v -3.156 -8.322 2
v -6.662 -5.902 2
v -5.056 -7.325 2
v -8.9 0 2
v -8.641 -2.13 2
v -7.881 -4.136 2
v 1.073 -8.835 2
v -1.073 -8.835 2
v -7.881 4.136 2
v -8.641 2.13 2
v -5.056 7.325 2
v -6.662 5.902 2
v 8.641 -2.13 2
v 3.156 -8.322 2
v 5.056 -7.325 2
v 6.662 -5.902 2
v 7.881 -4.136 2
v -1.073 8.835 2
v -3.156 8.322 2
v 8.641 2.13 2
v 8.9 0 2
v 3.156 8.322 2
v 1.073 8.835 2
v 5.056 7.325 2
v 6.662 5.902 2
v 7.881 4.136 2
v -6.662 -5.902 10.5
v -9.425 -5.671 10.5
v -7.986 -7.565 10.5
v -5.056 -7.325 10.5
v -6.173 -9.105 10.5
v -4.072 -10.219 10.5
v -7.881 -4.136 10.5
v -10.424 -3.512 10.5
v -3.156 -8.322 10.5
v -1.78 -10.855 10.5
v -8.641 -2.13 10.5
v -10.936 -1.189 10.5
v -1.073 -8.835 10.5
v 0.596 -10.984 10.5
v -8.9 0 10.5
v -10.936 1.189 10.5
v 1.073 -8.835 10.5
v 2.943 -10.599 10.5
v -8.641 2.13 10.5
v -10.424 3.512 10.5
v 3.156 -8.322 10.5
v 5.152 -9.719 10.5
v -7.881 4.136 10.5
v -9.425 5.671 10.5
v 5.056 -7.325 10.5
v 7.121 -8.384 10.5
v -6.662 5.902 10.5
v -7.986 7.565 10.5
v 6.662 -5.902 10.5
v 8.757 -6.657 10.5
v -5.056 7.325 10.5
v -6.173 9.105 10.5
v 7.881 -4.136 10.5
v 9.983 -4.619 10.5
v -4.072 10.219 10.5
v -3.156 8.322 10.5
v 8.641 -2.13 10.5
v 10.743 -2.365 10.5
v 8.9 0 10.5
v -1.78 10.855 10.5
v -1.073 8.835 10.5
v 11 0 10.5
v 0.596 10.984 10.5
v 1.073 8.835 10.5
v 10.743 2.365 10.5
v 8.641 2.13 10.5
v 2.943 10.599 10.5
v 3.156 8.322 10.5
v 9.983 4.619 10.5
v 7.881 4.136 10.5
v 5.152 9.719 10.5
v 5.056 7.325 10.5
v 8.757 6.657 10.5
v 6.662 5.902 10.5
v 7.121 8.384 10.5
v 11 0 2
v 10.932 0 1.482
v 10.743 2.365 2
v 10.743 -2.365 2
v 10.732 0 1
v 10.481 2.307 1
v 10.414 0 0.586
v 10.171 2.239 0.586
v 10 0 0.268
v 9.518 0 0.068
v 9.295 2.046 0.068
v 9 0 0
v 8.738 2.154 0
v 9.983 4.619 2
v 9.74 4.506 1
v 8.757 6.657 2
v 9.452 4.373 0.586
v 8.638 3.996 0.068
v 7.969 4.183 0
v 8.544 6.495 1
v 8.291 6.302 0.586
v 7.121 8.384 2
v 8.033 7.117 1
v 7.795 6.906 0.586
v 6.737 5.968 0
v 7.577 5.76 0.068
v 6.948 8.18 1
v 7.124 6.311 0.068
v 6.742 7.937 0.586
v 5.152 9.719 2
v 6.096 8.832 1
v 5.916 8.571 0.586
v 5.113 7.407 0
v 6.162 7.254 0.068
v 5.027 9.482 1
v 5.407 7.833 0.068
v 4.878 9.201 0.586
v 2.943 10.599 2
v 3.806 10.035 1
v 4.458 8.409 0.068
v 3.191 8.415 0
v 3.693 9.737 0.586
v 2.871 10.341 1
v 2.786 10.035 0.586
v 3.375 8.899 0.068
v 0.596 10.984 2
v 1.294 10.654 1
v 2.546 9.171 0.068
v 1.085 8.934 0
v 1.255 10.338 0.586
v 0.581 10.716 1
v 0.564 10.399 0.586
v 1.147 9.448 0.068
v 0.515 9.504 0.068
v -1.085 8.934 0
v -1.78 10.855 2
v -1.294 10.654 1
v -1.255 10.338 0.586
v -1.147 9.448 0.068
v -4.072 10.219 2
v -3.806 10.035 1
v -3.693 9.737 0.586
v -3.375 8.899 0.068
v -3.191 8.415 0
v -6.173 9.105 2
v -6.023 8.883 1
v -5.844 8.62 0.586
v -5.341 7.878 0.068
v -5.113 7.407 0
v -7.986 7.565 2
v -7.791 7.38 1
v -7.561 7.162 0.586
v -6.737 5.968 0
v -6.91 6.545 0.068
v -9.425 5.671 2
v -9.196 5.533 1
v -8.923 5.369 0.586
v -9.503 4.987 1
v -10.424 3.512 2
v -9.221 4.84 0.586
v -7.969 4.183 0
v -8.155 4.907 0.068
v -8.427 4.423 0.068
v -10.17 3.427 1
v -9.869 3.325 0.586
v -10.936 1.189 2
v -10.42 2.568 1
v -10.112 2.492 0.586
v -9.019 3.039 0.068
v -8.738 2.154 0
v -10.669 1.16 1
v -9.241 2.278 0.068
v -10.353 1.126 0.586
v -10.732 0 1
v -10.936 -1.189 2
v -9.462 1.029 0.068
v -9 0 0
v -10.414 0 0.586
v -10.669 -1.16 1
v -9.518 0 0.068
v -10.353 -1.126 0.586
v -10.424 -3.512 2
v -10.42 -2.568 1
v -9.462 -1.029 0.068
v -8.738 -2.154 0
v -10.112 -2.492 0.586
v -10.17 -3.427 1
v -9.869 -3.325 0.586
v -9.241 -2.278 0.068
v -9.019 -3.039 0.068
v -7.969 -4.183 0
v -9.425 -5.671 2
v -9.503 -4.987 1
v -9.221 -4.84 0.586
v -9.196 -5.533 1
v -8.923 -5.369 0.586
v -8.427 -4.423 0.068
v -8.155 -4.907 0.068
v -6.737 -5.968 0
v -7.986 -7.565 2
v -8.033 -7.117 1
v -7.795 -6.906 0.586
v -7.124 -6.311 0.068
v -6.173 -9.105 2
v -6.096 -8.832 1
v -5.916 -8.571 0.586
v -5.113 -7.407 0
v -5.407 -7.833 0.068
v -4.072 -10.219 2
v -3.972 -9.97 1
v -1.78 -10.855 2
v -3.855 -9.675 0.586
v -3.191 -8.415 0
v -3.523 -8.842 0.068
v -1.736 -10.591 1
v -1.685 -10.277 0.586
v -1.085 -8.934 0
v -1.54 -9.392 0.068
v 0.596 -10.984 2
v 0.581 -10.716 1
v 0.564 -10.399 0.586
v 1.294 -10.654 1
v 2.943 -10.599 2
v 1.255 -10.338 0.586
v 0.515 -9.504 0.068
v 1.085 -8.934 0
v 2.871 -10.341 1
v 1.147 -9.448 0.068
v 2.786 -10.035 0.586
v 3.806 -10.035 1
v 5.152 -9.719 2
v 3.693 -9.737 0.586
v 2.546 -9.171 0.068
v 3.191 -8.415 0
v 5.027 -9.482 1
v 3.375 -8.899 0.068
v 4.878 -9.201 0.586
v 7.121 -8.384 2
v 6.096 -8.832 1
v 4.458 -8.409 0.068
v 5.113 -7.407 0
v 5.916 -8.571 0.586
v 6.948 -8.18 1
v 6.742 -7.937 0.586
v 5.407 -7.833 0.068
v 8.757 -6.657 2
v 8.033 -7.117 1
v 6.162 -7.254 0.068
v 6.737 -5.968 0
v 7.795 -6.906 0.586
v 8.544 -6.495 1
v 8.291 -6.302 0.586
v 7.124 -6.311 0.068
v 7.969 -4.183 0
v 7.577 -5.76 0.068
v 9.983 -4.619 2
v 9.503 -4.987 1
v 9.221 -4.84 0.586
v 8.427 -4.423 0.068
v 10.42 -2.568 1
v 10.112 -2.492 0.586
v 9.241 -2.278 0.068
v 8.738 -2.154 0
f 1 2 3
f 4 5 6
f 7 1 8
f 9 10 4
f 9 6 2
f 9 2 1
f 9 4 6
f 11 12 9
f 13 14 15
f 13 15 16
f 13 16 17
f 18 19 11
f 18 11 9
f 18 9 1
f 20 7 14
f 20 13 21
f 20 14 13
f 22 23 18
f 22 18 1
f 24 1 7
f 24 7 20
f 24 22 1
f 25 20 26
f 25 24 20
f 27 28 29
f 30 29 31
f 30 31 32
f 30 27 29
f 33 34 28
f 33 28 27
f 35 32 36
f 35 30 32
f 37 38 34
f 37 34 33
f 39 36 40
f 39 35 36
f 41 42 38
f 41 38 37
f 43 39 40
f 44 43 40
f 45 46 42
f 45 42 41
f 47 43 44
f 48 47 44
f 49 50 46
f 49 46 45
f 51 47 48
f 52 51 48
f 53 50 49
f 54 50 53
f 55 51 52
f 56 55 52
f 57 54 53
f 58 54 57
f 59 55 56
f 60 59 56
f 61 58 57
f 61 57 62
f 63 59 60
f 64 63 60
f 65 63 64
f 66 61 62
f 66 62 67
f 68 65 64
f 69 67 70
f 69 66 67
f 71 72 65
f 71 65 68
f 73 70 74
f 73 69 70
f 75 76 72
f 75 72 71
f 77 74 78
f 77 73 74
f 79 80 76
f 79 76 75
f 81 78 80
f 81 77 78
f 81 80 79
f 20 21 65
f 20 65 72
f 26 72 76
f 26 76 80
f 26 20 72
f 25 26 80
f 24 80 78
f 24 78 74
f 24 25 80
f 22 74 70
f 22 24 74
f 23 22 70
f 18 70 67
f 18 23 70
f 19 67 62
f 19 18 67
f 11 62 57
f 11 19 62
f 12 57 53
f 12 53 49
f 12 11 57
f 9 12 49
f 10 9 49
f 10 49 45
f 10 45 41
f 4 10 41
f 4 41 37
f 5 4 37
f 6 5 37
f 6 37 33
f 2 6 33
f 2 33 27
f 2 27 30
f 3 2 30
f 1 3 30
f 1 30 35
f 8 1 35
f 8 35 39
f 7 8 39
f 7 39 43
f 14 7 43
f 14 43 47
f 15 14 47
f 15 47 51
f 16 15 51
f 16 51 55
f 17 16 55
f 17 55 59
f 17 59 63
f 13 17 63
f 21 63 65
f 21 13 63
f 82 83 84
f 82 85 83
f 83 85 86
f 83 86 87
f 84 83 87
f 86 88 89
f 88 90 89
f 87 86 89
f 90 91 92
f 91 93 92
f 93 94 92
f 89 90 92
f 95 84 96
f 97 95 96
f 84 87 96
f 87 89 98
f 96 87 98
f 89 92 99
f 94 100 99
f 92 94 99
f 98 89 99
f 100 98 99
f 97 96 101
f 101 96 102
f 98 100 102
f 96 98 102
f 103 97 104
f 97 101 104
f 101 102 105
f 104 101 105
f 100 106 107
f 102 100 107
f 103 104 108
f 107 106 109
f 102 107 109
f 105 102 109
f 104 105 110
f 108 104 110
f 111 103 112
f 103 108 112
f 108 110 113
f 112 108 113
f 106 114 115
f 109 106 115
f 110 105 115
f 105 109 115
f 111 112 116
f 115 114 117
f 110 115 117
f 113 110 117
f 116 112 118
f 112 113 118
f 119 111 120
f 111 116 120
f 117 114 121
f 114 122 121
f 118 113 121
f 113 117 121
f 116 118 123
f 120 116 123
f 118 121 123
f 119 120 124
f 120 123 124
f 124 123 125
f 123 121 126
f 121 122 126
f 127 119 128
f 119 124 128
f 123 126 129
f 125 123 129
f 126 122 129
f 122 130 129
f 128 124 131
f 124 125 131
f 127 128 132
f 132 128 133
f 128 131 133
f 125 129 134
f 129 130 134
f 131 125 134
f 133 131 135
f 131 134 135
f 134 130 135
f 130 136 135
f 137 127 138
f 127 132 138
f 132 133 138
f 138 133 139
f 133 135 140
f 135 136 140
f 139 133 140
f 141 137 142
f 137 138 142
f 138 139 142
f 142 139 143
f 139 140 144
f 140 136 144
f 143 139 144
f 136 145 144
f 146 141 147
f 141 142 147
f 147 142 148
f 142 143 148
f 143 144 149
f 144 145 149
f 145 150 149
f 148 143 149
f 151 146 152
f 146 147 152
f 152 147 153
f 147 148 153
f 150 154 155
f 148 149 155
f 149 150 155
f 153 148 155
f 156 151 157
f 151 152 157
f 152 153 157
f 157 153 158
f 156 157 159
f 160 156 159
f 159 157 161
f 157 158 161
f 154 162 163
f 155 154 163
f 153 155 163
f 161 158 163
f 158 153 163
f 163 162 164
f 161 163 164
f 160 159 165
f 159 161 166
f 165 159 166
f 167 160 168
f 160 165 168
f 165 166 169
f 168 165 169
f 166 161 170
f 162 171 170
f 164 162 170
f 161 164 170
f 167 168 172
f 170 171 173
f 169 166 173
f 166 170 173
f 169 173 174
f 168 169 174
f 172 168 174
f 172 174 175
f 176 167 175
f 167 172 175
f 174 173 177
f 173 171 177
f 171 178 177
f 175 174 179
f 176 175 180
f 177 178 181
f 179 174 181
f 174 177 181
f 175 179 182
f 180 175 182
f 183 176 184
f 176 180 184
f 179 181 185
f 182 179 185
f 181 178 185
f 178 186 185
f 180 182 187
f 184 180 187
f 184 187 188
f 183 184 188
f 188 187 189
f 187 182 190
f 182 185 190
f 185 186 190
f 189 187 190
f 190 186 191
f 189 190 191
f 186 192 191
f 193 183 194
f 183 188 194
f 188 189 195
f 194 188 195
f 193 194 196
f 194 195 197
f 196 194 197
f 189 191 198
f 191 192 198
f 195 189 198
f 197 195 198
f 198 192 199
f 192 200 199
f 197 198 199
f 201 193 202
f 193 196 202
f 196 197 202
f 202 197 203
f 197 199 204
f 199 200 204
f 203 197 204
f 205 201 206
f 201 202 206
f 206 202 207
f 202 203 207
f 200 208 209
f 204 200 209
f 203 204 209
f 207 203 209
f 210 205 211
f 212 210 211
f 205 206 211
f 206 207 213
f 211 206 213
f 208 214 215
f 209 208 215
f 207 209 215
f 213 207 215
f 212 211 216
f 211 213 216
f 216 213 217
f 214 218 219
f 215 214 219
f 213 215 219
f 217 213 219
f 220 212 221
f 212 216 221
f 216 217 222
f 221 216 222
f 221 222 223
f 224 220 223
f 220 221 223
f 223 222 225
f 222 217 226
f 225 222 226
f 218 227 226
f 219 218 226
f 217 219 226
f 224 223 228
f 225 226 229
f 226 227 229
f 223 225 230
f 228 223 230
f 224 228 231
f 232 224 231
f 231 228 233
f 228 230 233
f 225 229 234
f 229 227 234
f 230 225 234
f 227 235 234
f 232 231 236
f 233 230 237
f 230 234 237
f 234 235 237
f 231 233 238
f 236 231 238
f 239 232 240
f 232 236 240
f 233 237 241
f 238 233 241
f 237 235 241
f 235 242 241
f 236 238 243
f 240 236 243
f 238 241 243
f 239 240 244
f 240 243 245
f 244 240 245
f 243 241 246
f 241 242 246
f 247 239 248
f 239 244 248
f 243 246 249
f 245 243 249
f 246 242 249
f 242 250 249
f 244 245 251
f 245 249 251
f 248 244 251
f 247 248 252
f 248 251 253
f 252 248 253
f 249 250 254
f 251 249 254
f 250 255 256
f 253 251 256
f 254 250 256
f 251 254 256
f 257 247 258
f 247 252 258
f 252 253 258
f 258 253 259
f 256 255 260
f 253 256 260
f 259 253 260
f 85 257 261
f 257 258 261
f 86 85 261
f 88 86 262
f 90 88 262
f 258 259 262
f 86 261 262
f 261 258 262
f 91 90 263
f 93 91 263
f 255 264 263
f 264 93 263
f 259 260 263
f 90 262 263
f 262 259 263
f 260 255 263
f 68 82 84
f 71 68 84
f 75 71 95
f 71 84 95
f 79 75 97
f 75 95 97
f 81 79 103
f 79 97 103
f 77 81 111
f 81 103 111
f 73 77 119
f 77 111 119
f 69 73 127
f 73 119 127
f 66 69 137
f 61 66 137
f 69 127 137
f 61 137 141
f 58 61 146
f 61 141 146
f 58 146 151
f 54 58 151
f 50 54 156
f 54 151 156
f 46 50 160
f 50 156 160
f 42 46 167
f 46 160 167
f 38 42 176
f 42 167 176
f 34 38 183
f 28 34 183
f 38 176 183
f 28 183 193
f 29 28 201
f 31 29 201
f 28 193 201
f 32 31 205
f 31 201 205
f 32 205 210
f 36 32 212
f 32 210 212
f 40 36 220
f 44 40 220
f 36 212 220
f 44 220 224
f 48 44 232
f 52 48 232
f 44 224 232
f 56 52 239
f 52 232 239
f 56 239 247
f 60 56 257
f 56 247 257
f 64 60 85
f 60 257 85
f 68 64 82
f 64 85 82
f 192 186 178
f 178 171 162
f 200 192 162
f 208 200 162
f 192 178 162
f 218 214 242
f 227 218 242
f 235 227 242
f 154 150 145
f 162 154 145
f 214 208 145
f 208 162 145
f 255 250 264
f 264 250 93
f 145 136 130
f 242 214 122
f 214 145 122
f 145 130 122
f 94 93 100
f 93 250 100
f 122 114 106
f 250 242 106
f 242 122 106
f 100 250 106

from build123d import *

# Parameters (mm, degrees)
F0_R     = 8.9
F1_DEPTH = 2
F0_R_2   = 11
F2_DEPTH = 10.5
F3_R     = 2


with BuildPart() as f1:
    # F0 (on Top) → F1 (new body)
    with BuildSketch(Plane.XY):
        Circle(F0_R)
    extrude(amount=F1_DEPTH)

    # F0 (on Top) → F2 (join)
    with BuildSketch(Plane.XY):
        Circle(F0_R_2)
        Circle(F0_R, mode=Mode.SUBTRACT)
    extrude(amount=F2_DEPTH)

    # F3
    f3_edges = [f1.edges().sort_by_distance(p)[0] for p in [
        (-11, 0, 0),
    ]]
    fillet(f3_edges, radius=F3_R)


solid = f1.part
